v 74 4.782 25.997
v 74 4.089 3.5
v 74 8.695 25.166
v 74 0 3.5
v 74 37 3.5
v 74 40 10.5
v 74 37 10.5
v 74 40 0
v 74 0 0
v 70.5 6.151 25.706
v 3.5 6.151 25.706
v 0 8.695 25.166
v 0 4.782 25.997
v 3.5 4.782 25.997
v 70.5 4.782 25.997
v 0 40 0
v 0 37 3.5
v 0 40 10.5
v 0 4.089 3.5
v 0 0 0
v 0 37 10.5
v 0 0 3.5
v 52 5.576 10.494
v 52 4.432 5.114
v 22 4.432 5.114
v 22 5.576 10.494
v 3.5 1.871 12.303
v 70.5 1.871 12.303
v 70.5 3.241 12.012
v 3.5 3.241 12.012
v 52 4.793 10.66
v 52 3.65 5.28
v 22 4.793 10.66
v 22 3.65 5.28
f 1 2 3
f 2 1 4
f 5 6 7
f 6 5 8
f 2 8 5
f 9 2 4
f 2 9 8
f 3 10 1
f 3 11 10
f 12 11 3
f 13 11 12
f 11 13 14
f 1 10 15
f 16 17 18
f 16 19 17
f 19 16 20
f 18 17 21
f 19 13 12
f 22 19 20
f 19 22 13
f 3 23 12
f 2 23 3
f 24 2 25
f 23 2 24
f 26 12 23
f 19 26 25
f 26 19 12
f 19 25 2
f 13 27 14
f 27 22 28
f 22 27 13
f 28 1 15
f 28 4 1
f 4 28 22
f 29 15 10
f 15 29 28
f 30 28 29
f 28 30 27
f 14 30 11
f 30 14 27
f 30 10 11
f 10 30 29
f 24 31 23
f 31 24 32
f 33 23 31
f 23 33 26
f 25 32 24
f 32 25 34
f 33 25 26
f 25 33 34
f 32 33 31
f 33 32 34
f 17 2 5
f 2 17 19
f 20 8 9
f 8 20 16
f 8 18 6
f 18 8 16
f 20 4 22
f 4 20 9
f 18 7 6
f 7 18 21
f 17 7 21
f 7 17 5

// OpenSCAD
// pb_card_stand_v1.scad — PrimeBind Single Card Display Stand
//
// Holds one sleeved raw Pokemon card at a 12° backward tilt.
// Logo emboss panel on the front face, bottom center — drop SVG in slicer.
// Compact footprint, prints flat with no supports.
//
// Fits: standard poly sleeve over 63mm card (~67mm sleeved width)
// Print: Matte PLA | flat on bed | no supports needed
// Minitest: 50% scale in Creality Print — check slot fits sleeved card snug

// ── Card + sleeve ─────────────────────────────────────────────────────────────
CARD_W     = 63.0;   // raw Pokemon card width
SLEEVE_ADD = 3.6;    // total sleeve adds ~1.8mm per side in width
SLEEVE_T   = 1.2;    // card + sleeve total thickness (with clearance)

// ── Slot ──────────────────────────────────────────────────────────────────────
SLOT_W     = CARD_W + SLEEVE_ADD + 0.4;   // 67mm — snug in standard sleeve
SLOT_DEPTH = 14.0;   // how far the card sits down into the stand
SLOT_T     = SLEEVE_T + 0.2;              // slot front-to-back (1.4mm)

// ── Stand geometry ────────────────────────────────────────────────────────────
TILT      = 12;     // degrees the card leans back from vertical
COL_THICK = 4.0;    // front column wall thickness
WALL      = 3.5;    // side wall either side of slot
LEDGE     = 9.0;    // column height below slot (front face / logo area)
COL_H     = SLOT_DEPTH + LEDGE;    // total column height = 23mm
FACE_W    = SLOT_W + WALL * 2;     // stand width = ~74mm
BASE_T    = 3.5;    // base plate thickness
BASE_D    = 40.0;   // base plate depth (front-to-back)
FOOT_T    = 3.0;    // rear foot wall thickness
FOOT_H    = 7.0;    // rear foot height above base surface

// ── Logo emboss ───────────────────────────────────────────────────────────────
// Sunken 0.8mm panel on the front face — import PrimeBind logo SVG in slicer
LOGO_W     = 30.0;
LOGO_H     = 5.5;
LOGO_Z     = 2.5;   // distance from bottom of column
LOGO_DEPTH = 0.8;

echo("─────────────────────────────────");
echo("Stand width:", FACE_W, "mm  depth:", BASE_D, "mm");
echo("Column height:", COL_H, "mm  tilt:", TILT, "°");
echo("Slot:", SLOT_W, "×", SLOT_T, "×", SLOT_DEPTH, "mm");
echo("─────────────────────────────────");


module card_stand() {
    // ── Base plate ────────────────────────────────────────────────────────────
    cube([FACE_W, BASE_D, BASE_T]);

    // ── Rear foot ─────────────────────────────────────────────────────────────
    // Raised ledge at back edge — balances card weight, cleans up the silhouette
    translate([0, BASE_D - FOOT_T, 0])
        cube([FACE_W, FOOT_T, BASE_T + FOOT_H]);

    // ── Front column ──────────────────────────────────────────────────────────
    // Pivots backward TILT° around its bottom front edge (at Y=0, Z=BASE_T).
    // Card drops into the slot at the top; leans back at the tilt angle.
    translate([0, 0, BASE_T])
    rotate([-TILT, 0, 0])
    difference() {
        cube([FACE_W, COL_THICK, COL_H]);

        // Card slot — open at top, card slides straight down into it
        translate([WALL, -0.1, COL_H - SLOT_DEPTH])
            cube([SLOT_W, SLOT_T + 0.1, SLOT_DEPTH + 0.1]);

        // Logo emboss — sunken into front face, centered, near bottom
        translate([FACE_W/2 - LOGO_W/2, COL_THICK - LOGO_DEPTH, LOGO_Z])
            cube([LOGO_W, LOGO_DEPTH + 0.1, LOGO_H]);
    }
}


card_stand();
